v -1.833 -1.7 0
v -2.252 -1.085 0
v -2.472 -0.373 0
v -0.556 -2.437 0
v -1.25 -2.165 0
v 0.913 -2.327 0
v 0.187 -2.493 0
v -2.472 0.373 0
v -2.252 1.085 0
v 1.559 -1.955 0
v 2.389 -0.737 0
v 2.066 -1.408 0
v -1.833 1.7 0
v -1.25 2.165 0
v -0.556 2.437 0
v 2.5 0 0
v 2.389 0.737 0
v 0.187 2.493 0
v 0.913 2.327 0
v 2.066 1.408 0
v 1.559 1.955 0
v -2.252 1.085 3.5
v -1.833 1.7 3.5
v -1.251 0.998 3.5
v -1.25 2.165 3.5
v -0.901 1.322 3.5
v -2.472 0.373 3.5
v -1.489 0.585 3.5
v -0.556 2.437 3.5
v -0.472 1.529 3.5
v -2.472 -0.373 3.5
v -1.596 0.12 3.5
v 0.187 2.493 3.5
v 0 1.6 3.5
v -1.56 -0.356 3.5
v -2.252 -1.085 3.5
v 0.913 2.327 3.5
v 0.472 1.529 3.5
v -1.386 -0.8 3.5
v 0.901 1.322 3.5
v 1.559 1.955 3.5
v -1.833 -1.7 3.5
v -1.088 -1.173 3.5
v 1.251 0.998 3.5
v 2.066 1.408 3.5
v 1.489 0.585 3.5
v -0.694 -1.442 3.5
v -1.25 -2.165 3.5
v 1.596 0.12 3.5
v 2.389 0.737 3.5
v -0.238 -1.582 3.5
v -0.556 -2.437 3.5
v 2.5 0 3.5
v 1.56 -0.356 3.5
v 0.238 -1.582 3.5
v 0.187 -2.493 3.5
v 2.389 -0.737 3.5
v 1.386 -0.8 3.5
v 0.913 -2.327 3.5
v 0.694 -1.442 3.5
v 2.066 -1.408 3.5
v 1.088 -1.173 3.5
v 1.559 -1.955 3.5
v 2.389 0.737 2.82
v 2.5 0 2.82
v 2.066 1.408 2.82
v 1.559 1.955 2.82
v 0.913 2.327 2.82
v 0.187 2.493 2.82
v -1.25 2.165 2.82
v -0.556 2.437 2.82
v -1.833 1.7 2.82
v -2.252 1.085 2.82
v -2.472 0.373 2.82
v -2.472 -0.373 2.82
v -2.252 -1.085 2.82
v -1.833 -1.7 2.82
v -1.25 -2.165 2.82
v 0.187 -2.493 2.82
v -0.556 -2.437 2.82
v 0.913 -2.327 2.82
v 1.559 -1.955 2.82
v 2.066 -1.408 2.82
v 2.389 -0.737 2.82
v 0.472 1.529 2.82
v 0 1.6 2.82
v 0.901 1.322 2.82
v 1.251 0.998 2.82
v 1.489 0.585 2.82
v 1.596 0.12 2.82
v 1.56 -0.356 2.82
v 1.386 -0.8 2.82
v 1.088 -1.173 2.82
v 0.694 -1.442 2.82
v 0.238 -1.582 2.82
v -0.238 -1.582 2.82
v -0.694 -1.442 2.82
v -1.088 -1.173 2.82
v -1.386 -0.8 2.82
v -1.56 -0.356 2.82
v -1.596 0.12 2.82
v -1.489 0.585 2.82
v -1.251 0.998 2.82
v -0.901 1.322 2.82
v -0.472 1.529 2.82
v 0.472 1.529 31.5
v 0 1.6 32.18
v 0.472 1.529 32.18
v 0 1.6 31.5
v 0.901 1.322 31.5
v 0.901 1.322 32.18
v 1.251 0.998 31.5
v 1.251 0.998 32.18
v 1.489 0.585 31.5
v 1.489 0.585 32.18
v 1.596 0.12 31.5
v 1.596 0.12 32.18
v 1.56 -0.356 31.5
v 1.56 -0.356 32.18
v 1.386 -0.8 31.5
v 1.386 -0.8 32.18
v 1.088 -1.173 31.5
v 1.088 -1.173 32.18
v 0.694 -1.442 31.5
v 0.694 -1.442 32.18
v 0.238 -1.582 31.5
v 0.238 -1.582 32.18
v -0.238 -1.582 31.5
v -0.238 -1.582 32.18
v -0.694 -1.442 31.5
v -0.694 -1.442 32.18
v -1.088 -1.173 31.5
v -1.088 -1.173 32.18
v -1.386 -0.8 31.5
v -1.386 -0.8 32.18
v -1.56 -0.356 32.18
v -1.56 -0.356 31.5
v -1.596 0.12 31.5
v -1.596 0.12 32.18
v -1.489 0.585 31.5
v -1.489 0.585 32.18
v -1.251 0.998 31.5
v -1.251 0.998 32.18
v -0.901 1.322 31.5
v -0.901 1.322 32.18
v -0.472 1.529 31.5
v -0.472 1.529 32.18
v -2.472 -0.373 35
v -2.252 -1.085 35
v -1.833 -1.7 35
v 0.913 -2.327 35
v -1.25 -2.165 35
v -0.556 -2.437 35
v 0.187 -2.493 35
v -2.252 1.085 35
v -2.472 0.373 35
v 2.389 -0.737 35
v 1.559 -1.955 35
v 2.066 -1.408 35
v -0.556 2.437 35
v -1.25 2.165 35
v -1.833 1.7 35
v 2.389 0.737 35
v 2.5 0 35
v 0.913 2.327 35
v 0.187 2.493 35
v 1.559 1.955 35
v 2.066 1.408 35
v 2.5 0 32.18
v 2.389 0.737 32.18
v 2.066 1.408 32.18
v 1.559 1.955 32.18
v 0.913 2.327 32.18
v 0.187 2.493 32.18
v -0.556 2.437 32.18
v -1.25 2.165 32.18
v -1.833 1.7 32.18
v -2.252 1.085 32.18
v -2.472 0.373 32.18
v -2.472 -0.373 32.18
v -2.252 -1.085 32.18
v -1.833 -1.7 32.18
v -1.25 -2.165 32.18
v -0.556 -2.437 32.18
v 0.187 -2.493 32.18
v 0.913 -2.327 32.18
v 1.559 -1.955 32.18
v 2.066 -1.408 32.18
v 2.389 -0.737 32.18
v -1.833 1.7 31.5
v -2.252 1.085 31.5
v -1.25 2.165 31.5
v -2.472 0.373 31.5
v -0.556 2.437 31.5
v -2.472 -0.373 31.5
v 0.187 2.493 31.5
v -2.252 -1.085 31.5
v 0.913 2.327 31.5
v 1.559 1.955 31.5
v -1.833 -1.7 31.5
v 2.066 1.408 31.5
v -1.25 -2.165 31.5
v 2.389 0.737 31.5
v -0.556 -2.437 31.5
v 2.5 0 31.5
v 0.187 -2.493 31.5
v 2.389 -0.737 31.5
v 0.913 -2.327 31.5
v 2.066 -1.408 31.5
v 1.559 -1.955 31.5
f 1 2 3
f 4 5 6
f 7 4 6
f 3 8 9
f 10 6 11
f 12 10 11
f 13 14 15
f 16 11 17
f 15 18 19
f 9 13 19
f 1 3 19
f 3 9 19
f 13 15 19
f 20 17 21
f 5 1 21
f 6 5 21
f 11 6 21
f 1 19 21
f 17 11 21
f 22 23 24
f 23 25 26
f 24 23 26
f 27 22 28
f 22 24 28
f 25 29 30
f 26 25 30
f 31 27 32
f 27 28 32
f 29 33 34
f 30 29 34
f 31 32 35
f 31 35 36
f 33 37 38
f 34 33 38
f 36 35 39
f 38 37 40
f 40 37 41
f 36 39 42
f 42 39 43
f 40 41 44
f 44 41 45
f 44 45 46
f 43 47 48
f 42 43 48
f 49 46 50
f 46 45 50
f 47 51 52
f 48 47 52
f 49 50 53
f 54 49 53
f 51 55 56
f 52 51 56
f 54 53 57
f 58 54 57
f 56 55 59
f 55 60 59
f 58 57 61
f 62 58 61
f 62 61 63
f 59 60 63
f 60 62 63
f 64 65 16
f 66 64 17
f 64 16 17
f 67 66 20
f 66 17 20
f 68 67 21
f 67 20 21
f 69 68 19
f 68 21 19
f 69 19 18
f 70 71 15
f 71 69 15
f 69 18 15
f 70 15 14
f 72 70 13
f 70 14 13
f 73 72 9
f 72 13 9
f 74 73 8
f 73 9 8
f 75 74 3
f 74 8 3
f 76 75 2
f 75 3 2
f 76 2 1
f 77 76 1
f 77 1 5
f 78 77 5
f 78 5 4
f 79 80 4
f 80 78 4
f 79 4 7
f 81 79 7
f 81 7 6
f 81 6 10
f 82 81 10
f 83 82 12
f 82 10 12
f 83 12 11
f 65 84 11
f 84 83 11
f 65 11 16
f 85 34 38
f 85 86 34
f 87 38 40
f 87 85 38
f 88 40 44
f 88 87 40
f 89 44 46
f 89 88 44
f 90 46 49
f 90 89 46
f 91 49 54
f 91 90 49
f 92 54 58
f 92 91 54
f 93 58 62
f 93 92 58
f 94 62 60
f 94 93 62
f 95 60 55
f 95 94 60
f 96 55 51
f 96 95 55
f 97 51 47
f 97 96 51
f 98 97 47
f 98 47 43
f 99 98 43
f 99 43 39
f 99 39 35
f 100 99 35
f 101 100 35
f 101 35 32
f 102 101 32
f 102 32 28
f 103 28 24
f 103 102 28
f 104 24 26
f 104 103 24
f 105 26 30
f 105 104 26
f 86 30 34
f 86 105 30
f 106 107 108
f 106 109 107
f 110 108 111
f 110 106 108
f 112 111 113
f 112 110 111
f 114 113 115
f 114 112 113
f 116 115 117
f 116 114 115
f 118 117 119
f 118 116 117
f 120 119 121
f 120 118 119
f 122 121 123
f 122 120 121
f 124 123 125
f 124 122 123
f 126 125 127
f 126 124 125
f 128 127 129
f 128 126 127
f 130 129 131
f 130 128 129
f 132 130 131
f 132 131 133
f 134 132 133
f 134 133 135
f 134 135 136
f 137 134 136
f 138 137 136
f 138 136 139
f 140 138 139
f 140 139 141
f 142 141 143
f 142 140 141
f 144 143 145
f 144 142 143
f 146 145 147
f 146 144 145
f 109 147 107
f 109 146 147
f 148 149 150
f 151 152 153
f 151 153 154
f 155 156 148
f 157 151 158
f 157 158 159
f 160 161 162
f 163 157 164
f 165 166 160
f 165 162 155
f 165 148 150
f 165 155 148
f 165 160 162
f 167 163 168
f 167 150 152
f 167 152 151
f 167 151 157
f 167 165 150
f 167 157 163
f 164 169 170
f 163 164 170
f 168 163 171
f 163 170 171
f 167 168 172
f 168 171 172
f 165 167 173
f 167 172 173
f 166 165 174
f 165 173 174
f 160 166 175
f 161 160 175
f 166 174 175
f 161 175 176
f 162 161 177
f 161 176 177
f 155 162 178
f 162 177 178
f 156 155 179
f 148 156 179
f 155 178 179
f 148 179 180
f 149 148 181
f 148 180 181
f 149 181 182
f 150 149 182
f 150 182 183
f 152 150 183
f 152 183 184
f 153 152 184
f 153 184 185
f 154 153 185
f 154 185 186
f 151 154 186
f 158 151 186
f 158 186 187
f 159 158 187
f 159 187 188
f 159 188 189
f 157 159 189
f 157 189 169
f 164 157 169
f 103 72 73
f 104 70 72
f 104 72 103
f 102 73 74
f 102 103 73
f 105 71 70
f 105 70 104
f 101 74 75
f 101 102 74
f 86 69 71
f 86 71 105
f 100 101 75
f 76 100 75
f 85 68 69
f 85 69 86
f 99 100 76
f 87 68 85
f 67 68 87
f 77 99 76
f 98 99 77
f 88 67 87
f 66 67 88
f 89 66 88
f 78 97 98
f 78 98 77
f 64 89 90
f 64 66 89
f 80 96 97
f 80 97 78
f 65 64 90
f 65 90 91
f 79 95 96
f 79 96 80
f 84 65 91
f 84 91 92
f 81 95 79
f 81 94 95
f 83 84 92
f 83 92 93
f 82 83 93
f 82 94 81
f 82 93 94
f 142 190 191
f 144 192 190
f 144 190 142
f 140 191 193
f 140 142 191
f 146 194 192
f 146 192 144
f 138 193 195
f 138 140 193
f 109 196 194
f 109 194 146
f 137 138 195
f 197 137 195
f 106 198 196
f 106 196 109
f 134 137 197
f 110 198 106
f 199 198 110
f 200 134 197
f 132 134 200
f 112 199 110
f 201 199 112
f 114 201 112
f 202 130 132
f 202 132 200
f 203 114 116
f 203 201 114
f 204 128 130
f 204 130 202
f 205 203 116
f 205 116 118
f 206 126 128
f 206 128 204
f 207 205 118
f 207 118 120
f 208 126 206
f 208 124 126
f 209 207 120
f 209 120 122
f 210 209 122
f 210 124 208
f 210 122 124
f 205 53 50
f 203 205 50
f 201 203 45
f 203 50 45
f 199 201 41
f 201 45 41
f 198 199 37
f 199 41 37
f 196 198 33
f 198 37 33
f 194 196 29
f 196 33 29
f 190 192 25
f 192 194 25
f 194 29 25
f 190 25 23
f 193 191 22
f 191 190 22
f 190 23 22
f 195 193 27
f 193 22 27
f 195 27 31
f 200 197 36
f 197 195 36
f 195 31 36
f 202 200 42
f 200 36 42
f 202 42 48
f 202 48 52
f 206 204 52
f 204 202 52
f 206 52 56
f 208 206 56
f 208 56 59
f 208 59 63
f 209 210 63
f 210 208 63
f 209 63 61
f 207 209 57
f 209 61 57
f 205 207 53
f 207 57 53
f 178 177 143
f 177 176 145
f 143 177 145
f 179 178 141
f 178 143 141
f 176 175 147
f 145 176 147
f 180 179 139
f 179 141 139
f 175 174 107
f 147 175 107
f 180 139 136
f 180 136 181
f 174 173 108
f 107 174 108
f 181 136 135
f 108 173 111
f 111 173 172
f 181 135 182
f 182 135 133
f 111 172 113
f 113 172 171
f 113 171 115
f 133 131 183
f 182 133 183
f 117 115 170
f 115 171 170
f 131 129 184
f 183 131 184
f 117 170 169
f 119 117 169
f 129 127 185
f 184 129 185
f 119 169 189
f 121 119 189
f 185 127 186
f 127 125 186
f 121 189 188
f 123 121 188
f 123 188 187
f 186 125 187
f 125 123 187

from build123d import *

# Parameters (mm, degrees)
SKETCH1_R           = 2.5
BOSS_EXTRUDE1_DEPTH = 35
SKETCH2_W           = 0.68
SKETCH2_H           = 0.9


with BuildPart() as part:
    # Sketch1 → Boss-Extrude1 (new body)
    with BuildSketch(Plane.XY):
        Circle(SKETCH1_R)
    extrude(amount=BOSS_EXTRUDE1_DEPTH)

    # Sketch2 → Cut-Revolve1 (revolve, cut)
    with BuildSketch(Plane(origin=(0, 0, 0), x_dir=(0, 0, -1), z_dir=(1, 0, 0))):
        with Locations((-31.84, 2.05)):
            Rectangle(SKETCH2_W, SKETCH2_H)
        with Locations((-3.16, 2.05)):
            Rectangle(SKETCH2_W, SKETCH2_H)
    revolve(axis=Axis((0, 0, 35), (0, 0, -1)), mode=Mode.SUBTRACT)


solid = part.part
